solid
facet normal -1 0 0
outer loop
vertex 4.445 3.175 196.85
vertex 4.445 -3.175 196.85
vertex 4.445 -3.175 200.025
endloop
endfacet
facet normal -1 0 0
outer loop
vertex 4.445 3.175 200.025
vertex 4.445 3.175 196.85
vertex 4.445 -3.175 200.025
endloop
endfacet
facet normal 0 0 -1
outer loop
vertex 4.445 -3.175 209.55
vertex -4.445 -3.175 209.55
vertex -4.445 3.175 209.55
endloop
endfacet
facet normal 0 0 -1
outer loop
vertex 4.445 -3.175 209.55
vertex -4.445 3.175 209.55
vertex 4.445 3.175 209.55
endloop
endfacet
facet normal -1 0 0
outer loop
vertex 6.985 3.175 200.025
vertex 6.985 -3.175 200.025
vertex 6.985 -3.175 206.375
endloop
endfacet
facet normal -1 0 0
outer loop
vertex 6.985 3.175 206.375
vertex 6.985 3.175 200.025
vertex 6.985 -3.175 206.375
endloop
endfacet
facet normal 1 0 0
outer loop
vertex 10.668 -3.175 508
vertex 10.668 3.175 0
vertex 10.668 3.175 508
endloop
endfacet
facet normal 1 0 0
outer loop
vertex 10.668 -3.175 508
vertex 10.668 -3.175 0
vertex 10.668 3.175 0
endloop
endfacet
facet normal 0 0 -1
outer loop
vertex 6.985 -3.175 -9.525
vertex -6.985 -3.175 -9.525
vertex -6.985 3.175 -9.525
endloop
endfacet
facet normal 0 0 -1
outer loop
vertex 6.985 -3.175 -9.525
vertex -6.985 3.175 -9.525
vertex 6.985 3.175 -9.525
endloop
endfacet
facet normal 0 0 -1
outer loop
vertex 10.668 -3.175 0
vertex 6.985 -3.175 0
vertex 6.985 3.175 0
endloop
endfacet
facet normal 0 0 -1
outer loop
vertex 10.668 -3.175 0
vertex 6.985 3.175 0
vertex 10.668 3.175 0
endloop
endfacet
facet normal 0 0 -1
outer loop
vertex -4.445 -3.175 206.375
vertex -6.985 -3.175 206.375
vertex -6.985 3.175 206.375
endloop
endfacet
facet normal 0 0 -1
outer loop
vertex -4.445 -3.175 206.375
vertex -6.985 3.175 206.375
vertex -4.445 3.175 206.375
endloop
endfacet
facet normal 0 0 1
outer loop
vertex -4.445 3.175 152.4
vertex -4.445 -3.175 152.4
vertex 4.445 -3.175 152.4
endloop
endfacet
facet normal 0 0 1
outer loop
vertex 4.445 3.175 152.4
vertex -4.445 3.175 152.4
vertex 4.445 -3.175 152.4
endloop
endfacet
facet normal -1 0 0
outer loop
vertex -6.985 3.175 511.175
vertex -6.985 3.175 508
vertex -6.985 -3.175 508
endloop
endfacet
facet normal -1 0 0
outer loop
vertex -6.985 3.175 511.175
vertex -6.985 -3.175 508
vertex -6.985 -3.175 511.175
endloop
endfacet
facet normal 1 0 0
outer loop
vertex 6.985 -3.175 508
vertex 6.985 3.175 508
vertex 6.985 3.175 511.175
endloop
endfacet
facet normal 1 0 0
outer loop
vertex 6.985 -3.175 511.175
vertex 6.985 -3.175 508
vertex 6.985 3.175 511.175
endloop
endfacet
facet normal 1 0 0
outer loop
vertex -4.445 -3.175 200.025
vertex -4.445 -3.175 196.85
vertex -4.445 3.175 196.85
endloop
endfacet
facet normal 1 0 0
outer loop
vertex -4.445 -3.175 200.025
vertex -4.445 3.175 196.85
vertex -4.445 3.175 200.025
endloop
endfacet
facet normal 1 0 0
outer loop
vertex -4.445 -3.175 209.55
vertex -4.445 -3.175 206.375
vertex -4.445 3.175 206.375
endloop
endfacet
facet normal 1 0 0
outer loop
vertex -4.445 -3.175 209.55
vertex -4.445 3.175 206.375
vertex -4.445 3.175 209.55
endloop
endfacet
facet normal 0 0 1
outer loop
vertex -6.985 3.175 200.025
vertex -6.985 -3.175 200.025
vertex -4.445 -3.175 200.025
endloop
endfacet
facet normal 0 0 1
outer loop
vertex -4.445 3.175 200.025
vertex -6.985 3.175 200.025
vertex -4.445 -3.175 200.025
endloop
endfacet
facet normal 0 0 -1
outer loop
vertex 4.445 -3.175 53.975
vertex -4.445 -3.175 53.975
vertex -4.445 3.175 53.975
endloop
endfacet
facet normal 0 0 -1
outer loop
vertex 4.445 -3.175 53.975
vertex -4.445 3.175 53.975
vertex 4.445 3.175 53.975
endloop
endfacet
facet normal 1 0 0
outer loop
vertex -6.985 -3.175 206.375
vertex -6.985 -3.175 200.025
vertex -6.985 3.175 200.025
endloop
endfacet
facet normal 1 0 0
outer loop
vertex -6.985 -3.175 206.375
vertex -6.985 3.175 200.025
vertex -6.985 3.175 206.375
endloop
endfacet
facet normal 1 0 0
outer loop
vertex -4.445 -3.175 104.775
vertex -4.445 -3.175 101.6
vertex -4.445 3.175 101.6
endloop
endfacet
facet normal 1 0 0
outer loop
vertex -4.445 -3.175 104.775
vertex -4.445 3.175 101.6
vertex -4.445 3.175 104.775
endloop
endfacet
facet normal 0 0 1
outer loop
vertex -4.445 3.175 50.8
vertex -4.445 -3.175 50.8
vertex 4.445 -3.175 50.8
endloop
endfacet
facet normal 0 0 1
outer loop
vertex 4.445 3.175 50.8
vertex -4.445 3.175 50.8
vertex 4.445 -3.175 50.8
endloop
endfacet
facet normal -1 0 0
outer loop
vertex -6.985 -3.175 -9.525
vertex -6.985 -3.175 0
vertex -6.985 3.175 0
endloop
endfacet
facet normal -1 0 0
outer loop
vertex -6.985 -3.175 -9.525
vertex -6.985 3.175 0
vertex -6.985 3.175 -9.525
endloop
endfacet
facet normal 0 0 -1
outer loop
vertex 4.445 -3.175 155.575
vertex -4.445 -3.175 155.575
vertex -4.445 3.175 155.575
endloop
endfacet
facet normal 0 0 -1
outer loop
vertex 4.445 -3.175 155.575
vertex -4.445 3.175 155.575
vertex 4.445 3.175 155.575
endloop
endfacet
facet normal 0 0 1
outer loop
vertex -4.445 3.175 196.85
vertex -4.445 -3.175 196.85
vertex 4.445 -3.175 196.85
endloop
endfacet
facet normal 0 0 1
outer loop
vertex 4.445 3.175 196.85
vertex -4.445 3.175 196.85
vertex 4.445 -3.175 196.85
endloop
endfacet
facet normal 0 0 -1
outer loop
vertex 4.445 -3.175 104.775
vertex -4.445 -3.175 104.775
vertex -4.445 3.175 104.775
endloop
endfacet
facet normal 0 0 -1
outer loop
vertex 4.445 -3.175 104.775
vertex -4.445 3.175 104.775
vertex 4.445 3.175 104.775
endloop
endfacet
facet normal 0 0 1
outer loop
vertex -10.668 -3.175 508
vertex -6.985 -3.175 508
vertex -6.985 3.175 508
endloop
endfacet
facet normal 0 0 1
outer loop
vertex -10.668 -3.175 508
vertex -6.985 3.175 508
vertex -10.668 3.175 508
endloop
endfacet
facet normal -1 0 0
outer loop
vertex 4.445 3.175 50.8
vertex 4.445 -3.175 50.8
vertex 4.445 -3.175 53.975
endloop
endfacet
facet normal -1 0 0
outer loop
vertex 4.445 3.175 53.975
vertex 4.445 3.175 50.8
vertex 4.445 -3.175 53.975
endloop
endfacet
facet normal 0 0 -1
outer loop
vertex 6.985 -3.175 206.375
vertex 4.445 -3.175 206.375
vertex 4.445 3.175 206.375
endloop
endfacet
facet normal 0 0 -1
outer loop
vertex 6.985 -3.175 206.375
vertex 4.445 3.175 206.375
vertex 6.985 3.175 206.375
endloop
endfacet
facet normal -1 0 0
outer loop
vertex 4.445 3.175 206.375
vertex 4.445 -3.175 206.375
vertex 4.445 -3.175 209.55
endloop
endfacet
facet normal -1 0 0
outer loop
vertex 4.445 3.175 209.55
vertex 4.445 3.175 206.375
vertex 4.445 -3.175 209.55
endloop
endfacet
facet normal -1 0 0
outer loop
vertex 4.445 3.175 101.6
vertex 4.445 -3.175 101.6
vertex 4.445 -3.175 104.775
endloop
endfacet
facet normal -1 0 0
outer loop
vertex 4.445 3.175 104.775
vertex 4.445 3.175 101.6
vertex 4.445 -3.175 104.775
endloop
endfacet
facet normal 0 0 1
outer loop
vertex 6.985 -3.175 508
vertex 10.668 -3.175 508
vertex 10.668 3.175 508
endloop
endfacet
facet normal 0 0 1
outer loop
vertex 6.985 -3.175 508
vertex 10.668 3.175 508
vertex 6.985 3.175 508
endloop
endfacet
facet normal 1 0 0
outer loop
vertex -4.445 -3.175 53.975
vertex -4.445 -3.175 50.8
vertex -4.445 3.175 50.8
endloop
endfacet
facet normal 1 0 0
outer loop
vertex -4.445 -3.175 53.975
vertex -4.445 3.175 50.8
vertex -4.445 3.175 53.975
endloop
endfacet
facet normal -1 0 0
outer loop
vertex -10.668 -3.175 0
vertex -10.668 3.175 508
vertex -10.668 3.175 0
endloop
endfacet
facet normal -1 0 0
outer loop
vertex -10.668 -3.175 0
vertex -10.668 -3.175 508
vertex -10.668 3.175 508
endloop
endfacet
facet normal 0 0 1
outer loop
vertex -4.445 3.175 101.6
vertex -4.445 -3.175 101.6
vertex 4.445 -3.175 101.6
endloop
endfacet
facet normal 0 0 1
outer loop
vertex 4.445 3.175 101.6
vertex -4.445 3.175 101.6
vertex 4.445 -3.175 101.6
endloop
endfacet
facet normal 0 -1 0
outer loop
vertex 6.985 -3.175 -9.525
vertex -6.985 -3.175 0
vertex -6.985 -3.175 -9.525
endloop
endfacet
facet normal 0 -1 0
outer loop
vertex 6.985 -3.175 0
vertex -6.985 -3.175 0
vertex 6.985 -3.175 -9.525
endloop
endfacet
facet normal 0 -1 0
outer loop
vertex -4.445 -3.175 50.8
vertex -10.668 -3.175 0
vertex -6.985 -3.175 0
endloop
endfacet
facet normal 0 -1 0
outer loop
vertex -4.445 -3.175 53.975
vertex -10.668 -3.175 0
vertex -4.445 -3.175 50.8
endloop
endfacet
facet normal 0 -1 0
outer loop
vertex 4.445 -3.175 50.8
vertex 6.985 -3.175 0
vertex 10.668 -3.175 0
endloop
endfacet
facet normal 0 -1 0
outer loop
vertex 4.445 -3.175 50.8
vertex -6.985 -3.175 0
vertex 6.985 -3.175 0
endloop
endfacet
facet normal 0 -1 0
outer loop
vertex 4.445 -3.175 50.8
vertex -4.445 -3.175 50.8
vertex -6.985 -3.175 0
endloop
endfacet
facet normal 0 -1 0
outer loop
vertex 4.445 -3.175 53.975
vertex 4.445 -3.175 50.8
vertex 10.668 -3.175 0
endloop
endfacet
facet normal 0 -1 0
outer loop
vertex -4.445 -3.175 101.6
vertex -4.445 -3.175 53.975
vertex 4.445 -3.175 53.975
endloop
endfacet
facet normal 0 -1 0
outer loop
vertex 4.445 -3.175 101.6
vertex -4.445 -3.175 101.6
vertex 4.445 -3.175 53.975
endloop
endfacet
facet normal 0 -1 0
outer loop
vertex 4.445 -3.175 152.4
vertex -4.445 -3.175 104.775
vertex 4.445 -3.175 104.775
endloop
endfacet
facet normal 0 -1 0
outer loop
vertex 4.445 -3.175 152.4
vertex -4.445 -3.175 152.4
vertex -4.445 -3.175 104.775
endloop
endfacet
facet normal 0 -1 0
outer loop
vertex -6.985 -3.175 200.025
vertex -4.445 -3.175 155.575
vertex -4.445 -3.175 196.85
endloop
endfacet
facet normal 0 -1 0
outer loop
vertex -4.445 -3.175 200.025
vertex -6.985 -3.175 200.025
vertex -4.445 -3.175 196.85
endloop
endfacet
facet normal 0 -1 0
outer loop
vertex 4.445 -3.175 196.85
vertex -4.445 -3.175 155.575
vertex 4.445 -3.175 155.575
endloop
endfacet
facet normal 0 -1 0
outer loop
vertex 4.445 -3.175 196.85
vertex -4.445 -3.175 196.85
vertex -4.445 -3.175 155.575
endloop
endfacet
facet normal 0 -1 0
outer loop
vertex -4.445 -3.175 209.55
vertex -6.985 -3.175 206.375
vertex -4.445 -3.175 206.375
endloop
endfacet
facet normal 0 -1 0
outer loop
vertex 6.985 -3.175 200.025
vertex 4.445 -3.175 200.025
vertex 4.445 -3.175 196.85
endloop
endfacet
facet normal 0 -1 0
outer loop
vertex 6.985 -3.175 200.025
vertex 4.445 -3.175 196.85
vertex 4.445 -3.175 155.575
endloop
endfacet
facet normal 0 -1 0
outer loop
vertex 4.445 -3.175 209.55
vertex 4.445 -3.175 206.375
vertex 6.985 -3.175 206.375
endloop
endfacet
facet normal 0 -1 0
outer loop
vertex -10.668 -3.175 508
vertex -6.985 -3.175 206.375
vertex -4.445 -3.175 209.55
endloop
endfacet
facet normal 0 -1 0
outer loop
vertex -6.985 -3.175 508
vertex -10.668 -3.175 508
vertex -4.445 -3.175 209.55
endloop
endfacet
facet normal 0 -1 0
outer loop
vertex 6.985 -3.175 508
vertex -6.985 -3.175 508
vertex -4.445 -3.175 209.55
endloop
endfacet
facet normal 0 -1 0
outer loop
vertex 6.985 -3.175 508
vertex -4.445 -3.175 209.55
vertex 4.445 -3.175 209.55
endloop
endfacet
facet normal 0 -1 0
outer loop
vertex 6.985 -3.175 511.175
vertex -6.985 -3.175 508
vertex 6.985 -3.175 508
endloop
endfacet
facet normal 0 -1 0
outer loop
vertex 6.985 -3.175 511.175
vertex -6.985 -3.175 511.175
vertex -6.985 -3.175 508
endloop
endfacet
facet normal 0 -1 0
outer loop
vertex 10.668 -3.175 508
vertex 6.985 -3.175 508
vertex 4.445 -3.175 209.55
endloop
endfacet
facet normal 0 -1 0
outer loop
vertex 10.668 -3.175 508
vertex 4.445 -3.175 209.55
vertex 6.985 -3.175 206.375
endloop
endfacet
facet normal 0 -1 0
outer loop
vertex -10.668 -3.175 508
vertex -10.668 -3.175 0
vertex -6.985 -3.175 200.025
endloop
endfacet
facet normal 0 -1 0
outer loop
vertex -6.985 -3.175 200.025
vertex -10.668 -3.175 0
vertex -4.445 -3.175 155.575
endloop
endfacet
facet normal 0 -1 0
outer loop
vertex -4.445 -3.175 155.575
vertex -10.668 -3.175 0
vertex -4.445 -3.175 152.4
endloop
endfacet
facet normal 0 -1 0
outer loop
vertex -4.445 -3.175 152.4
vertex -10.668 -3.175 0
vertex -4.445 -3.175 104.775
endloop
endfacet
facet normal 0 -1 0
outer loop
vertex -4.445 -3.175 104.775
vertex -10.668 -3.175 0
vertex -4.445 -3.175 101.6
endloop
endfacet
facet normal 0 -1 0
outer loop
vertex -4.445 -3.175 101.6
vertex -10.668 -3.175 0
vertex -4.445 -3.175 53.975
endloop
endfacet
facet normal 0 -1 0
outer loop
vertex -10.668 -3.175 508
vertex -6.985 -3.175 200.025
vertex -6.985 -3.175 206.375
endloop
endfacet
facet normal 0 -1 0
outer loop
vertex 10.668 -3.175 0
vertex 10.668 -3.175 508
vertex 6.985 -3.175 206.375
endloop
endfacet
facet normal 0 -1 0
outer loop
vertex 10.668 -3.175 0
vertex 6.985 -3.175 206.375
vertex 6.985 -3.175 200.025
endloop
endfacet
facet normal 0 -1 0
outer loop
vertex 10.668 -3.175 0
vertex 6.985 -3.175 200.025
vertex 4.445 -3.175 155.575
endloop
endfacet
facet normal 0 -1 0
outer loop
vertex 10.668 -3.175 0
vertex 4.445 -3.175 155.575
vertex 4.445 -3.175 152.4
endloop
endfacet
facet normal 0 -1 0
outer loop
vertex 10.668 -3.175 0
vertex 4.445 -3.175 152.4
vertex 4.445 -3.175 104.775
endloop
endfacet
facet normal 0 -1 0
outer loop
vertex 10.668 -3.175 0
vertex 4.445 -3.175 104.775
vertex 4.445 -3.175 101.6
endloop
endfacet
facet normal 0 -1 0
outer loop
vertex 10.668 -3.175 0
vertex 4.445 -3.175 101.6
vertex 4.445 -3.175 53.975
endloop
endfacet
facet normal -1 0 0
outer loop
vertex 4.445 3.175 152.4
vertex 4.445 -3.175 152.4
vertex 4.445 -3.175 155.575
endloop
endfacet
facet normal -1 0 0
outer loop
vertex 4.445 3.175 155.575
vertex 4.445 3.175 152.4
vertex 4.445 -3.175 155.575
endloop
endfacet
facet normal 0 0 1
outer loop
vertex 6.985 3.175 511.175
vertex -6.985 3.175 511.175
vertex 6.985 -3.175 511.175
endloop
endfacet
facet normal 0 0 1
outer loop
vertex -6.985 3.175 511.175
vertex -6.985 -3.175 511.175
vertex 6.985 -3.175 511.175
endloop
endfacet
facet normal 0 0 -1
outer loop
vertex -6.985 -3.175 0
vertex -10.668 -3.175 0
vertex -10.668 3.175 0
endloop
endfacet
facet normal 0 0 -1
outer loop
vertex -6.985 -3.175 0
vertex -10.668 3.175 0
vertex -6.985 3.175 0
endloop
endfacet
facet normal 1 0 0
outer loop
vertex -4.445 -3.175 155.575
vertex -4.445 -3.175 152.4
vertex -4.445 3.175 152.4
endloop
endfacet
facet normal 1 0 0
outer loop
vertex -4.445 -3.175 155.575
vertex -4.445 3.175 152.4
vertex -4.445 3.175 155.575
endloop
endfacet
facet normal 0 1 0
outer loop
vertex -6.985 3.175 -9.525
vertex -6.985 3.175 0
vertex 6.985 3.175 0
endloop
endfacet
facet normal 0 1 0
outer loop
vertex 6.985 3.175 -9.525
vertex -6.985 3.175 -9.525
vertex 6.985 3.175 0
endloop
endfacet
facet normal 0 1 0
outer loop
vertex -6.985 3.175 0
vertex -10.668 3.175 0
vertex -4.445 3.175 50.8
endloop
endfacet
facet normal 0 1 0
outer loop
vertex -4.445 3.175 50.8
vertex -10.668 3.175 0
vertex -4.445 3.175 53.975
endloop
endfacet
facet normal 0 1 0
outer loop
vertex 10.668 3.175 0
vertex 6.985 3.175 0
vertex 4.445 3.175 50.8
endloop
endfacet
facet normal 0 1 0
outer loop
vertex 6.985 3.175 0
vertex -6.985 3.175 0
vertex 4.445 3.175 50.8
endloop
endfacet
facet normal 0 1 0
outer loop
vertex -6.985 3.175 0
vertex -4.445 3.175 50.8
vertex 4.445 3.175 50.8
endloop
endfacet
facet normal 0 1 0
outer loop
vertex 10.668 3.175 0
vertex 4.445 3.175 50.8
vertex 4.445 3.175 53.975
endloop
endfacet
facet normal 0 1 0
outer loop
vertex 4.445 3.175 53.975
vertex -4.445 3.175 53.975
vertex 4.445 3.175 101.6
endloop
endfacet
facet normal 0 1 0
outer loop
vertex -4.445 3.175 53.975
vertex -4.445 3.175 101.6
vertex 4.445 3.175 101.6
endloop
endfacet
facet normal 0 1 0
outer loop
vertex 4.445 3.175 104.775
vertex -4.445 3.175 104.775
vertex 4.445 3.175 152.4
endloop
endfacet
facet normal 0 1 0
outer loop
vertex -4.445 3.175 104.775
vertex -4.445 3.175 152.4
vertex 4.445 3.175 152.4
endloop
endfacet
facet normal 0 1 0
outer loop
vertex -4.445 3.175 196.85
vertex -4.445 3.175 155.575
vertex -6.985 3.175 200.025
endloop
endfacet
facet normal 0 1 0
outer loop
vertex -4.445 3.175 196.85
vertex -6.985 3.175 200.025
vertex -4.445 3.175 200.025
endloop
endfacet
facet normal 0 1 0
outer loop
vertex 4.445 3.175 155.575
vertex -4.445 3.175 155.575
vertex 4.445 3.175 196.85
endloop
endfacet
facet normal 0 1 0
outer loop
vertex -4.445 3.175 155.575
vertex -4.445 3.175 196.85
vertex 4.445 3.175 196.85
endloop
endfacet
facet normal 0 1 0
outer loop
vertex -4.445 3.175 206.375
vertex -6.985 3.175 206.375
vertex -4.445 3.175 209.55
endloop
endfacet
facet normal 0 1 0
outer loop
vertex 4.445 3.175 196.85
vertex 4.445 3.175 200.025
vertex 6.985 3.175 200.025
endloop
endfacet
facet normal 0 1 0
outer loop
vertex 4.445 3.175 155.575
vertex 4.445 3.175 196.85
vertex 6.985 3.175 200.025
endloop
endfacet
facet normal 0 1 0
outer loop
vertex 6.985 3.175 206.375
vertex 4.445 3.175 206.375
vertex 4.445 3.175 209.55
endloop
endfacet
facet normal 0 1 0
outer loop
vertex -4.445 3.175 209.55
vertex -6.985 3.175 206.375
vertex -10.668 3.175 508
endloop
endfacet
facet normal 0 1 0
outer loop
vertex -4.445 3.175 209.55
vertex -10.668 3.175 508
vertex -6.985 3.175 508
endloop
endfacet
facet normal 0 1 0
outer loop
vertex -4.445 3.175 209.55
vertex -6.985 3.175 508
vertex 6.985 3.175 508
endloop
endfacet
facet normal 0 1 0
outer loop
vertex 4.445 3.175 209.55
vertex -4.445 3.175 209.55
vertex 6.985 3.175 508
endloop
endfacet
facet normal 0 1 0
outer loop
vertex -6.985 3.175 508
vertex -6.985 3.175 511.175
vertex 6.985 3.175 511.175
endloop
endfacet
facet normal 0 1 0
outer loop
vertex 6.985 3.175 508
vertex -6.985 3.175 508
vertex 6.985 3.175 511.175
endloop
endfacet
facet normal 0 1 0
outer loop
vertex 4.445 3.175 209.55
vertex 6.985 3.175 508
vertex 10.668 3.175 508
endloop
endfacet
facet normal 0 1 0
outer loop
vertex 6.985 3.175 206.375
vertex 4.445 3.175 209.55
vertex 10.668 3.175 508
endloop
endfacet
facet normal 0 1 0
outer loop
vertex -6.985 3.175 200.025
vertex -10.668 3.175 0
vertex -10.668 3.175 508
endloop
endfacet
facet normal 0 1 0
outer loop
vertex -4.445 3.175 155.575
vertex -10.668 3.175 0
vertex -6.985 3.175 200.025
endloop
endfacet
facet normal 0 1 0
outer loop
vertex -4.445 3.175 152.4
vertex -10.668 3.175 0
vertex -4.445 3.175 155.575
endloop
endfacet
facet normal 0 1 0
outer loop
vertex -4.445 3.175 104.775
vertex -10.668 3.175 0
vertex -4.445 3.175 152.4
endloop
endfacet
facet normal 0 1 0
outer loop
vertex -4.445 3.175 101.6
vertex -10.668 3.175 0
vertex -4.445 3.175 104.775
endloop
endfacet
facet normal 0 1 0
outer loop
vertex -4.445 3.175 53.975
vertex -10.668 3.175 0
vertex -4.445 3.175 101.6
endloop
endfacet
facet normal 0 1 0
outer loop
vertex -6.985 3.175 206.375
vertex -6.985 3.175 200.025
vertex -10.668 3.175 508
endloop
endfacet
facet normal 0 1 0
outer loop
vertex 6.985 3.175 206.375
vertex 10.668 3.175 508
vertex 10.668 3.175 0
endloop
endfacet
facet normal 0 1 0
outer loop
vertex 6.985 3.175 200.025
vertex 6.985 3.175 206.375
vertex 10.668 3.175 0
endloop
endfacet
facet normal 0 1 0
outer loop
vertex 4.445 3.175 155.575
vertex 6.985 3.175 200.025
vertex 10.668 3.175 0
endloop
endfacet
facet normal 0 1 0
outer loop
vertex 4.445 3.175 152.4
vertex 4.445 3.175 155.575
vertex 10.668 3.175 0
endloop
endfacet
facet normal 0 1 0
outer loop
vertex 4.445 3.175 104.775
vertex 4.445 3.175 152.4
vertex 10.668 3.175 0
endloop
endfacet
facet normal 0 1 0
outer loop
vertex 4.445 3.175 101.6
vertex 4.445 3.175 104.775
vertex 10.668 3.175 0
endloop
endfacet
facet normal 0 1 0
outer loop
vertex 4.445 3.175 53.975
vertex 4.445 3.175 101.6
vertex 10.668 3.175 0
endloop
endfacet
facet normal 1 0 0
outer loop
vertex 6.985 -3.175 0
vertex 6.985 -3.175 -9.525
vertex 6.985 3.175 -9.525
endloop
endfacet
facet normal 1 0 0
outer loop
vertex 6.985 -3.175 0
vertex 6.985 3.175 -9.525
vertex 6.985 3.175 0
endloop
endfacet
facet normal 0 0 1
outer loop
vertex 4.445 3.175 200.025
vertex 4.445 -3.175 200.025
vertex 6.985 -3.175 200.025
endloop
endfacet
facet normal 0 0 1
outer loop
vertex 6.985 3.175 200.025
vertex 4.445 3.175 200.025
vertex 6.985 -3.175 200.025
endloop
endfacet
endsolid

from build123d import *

# Parameters (mm, degrees)
F1_DEPTH      = 3.175
F2_W          = 13.97
F2_H          = 3.175
F3_DEPTH      = 3.175
F3_DEPTH_BACK = 3.175
F4_W          = 13.97
F4_H          = 6.35
F5_DEPTH      = 6.35
F6_W          = 8.89
F6_H          = 3.175
F7_DEPTH      = 6.35
F8_W          = 8.89
F8_H          = 3.175
F9_DEPTH      = 6.35


with BuildPart() as f1:
    # F0 (on Front) → F1 (new body, symmetric)
    with BuildSketch(Plane.XZ):
        Polygon((-10.668, 508), (-10.668, 0), (-6.985, 0), (-6.985, -9.525), (6.985, -9.525), (6.985, 0), (10.668, 0), (10.668, 508), align=None)
    extrude(amount=F1_DEPTH, both=True)

    # F2 (on Front) → F3 (join, two sides)
    with BuildSketch(Plane.XZ) as f3_sk:
        with Locations((0, 509.5875)):
            Rectangle(F2_W, F2_H)
    extrude(amount=F3_DEPTH)
    extrude(f3_sk.sketch, amount=-F3_DEPTH_BACK)

    # F4 (on face) → F5 (cut, through all)
    with BuildSketch(Plane.XZ.offset(3.175)):
        with Locations((0, 203.2)):
            Rectangle(F4_W, F4_H)
    extrude(amount=-F5_DEPTH, mode=Mode.SUBTRACT)

    # F6 (on face) → F7 (cut, through all)
    with BuildSketch(Plane.XZ.offset(3.175)):
        with Locations((0, 207.9625)):
            Rectangle(F6_W, F6_H)
        with Locations((0, 198.4375)):
            Rectangle(F6_W, F6_H)
    extrude(amount=-F7_DEPTH, mode=Mode.SUBTRACT)

    # F8 (on face) → F9 (cut, through all)
    with BuildSketch(Plane.XZ.offset(3.175)):
        with Locations((0, 52.3875)):
            Rectangle(F8_W, F8_H)
        with Locations((0, 103.1875)):
            Rectangle(F8_W, F8_H)
        with Locations((0, 153.9875)):
            Rectangle(F8_W, F8_H)
    extrude(amount=-F9_DEPTH, mode=Mode.SUBTRACT)


solid = f1.part
